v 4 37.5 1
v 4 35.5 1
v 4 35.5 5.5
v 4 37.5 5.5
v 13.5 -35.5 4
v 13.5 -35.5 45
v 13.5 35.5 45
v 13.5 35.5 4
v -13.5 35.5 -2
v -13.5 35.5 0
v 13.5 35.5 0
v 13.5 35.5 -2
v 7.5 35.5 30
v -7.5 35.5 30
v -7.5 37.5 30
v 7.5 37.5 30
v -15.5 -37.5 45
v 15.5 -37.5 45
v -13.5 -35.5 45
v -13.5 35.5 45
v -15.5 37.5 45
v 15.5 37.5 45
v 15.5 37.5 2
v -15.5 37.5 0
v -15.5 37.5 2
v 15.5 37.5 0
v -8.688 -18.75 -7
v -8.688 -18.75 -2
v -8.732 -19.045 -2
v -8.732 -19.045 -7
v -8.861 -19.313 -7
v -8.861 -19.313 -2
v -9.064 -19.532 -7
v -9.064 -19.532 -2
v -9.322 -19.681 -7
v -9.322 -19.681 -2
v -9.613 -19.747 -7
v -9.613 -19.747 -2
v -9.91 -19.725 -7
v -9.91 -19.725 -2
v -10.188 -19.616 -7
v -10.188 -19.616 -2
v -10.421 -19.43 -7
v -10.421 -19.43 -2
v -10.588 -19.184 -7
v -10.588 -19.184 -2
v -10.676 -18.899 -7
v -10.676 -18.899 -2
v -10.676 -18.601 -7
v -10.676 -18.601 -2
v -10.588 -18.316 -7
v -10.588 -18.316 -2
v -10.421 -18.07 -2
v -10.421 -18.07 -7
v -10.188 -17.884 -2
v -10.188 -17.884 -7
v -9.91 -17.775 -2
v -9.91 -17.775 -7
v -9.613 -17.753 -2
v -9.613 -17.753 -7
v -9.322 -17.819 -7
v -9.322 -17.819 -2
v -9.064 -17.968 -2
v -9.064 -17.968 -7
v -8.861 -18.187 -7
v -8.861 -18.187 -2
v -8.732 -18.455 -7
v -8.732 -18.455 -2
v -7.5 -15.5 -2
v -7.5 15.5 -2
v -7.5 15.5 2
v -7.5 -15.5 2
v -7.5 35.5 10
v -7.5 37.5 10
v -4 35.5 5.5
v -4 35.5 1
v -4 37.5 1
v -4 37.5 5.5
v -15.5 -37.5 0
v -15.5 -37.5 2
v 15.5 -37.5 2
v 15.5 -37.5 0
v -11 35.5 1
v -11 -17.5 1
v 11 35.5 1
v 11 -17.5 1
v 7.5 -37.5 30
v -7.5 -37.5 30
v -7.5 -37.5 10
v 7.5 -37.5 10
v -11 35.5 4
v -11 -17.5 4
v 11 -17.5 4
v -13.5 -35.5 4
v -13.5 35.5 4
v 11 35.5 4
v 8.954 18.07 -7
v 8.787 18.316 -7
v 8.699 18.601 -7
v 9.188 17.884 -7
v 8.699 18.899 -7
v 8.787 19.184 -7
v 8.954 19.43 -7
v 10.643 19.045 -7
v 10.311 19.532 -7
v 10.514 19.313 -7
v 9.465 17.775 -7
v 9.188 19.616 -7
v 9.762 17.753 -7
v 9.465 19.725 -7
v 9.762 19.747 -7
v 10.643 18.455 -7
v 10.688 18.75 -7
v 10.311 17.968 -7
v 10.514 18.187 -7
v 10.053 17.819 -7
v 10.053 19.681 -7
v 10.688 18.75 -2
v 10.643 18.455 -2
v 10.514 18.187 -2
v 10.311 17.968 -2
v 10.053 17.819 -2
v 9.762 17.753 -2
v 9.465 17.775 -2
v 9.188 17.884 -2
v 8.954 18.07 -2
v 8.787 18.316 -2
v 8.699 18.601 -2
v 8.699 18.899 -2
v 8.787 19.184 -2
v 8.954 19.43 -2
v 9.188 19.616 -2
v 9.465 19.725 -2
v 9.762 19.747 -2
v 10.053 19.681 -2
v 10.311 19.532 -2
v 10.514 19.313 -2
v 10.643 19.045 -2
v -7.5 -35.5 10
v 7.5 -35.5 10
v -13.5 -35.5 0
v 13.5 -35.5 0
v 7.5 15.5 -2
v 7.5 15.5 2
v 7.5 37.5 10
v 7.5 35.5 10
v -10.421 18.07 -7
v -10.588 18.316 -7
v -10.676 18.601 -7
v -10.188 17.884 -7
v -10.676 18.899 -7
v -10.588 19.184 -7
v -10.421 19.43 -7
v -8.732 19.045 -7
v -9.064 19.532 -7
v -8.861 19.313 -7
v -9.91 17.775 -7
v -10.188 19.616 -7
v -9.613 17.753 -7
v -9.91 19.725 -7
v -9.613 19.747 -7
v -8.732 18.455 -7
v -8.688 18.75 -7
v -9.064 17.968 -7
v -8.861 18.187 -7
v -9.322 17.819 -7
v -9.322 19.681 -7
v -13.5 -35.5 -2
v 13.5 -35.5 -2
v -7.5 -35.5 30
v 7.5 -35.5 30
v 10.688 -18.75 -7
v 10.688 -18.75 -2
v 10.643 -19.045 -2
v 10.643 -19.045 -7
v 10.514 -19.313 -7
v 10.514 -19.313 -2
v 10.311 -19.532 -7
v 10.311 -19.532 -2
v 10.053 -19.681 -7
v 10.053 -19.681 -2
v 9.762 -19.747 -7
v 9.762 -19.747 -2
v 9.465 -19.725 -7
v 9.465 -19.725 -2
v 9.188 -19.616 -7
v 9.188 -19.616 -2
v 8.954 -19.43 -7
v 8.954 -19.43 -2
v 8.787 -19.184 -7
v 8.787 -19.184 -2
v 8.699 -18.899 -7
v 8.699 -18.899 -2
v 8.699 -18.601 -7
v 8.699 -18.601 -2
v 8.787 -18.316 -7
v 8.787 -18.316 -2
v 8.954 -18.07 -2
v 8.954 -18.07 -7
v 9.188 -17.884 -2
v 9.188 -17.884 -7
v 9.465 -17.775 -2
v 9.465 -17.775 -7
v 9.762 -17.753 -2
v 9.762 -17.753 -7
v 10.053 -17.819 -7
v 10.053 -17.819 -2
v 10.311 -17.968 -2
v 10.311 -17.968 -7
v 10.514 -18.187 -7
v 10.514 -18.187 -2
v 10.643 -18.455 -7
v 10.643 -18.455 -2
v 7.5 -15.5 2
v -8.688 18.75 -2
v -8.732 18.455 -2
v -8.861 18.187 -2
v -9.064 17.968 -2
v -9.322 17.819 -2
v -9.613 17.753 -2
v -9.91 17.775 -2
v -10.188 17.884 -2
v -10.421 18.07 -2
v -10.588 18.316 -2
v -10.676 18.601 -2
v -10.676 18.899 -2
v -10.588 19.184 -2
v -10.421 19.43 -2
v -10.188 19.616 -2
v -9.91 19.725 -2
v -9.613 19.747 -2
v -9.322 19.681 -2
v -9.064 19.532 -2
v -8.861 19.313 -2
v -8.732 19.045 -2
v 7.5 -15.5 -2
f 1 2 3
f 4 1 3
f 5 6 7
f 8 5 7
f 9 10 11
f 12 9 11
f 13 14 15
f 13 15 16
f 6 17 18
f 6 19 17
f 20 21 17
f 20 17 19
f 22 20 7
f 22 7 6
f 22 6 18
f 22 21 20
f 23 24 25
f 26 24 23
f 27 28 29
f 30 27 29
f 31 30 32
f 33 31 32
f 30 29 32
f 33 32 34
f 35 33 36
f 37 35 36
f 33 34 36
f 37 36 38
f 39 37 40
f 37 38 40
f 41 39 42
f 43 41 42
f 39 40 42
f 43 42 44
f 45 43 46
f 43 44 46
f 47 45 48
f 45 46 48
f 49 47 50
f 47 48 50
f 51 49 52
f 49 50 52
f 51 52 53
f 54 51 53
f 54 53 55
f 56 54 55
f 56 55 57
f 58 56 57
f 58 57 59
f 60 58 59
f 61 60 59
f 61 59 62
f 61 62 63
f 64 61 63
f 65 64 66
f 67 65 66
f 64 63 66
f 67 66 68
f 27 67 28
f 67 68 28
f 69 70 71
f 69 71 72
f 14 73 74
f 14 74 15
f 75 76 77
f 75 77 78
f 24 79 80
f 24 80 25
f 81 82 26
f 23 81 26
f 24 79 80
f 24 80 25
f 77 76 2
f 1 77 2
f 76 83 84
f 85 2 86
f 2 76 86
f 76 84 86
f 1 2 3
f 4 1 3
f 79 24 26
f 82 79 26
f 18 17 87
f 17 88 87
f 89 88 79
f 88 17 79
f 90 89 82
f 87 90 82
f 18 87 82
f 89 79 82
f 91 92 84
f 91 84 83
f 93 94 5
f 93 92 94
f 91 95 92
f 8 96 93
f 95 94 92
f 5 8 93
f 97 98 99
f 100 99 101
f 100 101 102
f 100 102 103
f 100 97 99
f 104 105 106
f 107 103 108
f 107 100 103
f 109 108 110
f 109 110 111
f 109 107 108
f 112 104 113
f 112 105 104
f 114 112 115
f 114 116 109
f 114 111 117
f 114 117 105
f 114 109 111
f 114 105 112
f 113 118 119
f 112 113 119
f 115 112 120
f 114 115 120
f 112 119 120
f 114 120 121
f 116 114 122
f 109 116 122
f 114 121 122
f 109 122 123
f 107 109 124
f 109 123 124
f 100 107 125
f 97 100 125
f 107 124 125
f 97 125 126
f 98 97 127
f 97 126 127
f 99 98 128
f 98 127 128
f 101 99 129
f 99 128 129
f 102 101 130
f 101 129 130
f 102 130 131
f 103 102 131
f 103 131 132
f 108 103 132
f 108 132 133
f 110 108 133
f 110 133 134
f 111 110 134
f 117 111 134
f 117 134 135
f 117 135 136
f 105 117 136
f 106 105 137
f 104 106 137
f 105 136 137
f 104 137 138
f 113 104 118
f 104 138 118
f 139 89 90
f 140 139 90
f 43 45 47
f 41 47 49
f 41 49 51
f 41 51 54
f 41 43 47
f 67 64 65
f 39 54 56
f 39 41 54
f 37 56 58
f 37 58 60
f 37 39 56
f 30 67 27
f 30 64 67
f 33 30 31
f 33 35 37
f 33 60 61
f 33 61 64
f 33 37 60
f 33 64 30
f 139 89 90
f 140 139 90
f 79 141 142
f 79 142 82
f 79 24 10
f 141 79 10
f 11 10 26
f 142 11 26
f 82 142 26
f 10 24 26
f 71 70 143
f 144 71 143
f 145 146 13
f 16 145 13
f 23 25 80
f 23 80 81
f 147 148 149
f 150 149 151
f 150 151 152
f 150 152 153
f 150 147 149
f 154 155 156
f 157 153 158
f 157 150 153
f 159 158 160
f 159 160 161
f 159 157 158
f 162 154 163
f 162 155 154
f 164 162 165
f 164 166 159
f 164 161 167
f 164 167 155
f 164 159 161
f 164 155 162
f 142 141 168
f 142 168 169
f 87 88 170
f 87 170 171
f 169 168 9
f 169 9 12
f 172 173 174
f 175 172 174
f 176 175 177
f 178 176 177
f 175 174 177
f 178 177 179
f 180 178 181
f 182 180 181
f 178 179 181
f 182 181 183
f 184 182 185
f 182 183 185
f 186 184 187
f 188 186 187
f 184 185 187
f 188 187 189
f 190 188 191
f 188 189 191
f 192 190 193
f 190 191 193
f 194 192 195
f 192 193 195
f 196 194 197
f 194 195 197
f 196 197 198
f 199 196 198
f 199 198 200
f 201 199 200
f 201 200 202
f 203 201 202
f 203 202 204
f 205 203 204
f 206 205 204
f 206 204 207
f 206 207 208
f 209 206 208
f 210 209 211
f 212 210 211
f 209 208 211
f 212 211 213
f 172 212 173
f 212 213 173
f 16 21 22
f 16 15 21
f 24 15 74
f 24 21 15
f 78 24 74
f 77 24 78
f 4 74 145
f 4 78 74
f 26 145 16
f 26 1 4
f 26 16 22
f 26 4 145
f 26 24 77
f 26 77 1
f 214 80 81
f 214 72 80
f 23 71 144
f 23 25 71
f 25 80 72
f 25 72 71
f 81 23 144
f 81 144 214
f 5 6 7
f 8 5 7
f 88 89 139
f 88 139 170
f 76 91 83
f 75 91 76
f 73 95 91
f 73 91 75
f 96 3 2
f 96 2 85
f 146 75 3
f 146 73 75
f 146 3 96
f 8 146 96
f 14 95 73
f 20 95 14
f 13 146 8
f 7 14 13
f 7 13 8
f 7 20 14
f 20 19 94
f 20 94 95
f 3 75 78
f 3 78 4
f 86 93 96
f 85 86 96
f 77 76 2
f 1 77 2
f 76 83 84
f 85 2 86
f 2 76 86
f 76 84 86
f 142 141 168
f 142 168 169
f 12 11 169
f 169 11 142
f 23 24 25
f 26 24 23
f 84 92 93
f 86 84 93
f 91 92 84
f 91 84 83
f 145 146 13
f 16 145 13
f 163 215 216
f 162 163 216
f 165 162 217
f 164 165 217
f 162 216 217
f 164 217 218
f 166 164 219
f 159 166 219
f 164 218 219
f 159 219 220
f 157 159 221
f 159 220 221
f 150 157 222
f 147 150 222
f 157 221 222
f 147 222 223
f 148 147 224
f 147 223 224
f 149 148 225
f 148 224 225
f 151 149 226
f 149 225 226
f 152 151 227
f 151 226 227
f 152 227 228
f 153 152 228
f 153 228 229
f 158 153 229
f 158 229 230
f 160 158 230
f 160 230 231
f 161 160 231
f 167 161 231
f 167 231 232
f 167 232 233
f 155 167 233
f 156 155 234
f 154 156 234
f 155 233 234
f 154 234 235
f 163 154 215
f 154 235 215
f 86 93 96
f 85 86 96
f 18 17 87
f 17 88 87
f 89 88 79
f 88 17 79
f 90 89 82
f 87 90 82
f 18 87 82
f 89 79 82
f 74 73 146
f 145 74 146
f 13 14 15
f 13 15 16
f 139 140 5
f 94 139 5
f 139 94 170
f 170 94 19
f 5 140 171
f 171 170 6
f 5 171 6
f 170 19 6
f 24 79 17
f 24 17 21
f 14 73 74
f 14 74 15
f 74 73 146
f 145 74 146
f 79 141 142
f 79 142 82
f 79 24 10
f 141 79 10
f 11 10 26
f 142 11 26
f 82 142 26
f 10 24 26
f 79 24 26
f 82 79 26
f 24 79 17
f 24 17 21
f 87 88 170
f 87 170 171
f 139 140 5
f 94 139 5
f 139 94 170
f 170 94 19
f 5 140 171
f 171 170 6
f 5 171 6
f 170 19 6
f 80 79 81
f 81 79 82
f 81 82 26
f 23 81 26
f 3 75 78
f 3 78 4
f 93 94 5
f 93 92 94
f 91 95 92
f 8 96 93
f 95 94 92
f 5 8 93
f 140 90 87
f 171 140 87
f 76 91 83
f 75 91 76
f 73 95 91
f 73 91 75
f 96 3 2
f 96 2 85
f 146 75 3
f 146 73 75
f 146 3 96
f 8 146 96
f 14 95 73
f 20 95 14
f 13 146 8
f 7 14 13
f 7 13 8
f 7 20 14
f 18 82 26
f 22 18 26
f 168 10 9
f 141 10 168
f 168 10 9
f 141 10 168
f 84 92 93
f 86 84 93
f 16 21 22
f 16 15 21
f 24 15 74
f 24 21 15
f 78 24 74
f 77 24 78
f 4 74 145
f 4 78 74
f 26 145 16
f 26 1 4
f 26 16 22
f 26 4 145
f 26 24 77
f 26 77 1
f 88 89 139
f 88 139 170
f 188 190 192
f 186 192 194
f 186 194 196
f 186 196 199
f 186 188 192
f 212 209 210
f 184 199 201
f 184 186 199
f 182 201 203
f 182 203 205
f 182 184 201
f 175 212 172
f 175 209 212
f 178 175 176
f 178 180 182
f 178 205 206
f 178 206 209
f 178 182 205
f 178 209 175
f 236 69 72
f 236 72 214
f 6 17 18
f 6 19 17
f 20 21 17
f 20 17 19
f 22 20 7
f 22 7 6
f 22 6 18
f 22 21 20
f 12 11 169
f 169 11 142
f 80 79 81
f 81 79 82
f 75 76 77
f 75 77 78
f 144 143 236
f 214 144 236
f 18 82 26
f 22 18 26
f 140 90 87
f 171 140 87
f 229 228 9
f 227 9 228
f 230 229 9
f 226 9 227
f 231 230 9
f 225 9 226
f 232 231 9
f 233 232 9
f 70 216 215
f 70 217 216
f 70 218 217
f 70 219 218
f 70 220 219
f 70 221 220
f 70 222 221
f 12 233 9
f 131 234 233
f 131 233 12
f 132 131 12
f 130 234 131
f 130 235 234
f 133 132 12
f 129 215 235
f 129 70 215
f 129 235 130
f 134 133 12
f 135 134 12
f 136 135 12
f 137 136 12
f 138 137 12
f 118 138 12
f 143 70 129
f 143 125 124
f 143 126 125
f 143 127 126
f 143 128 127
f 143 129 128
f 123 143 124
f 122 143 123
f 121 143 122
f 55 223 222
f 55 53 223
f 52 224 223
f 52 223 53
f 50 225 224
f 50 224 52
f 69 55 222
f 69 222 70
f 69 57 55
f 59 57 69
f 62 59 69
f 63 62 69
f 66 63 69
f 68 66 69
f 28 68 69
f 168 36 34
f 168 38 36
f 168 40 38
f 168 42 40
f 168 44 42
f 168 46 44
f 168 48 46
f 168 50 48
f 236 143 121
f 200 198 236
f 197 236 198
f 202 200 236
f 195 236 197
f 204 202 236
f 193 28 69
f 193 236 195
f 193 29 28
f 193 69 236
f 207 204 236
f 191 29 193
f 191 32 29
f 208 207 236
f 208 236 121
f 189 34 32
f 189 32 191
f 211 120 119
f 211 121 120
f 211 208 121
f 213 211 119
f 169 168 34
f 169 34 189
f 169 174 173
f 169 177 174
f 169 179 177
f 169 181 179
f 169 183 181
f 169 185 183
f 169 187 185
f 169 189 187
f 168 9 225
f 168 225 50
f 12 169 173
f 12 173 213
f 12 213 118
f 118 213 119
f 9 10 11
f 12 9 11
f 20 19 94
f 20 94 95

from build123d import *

# Parameters (mm, degrees)
SKETCH_W        = 31
SKETCH_H        = 75
PAD_DEPTH       = 45
SKETCH001_W     = 15
SKETCH001_H     = 20
POCKET_DEPTH    = 75
SKETCH002_W     = 27
SKETCH002_H     = 71
POCKET001_DEPTH = 41
SKETCH003_W     = 22
SKETCH003_H     = 53
POCKET002_DEPTH = 3
SKETCH004_W     = 8
SKETCH004_H     = 4.5
POCKET003_DEPTH = 5
SKETCH005_W     = 31
SKETCH005_H     = 75
PAD001_DEPTH    = 2
SKETCH006_W     = 27
SKETCH006_H     = 71
PAD002_DEPTH    = 2
SKETCH007_W     = 15
SKETCH007_H     = 31
POCKET004_DEPTH = 5
SKETCH008_R     = 1
PAD003_DEPTH    = 5
SKETCH009_W     = 31
SKETCH009_H     = 75
PAD004_DEPTH    = 45
SKETCH010_W     = 15
SKETCH010_H     = 20
POCKET005_DEPTH = 75
SKETCH011_W     = 27
SKETCH011_H     = 71
POCKET006_DEPTH = 41
SKETCH012_W     = 22
SKETCH012_H     = 53
POCKET007_DEPTH = 3
SKETCH013_W     = 8
SKETCH013_H     = 4.5
POCKET008_DEPTH = 5
SKETCH014_W     = 31
SKETCH014_H     = 75
PAD005_DEPTH    = 2
SKETCH015_W     = 27
SKETCH015_H     = 71
PAD006_DEPTH    = 2


with BuildPart() as body:
    # Sketch → Pad (new body)
    with BuildSketch(Plane.XY):
        Rectangle(SKETCH_W, SKETCH_H)
    extrude(amount=PAD_DEPTH)

    # Sketch001 (on Face3 of Pad) → Pocket (cut)
    with BuildSketch(Plane.XZ.offset(37.5)):
        with Locations((0, 20)):
            Rectangle(SKETCH001_W, SKETCH001_H)
    extrude(amount=-POCKET_DEPTH, mode=Mode.SUBTRACT)

    # Sketch002 (on Face4 of Pocket) → Pocket001 (cut)
    with BuildSketch(Plane.XY.offset(45)):
        Rectangle(SKETCH002_W, SKETCH002_H)
    extrude(amount=-POCKET001_DEPTH, mode=Mode.SUBTRACT)

    # Sketch003 (on Face19 of Pocket001) → Pocket002 (cut)
    with BuildSketch(Plane.XY.offset(4)):
        with Locations((0, 9)):
            Rectangle(SKETCH003_W, SKETCH003_H)
    extrude(amount=-POCKET002_DEPTH, mode=Mode.SUBTRACT)

    # Sketch004 (on Face14 of Pocket002) → Pocket003 (cut)
    with BuildSketch(Plane.XZ.offset(-35.5)):
        with Locations((0, 3.25)):
            Rectangle(SKETCH004_W, SKETCH004_H)
    extrude(amount=-POCKET003_DEPTH, mode=Mode.SUBTRACT)


with BuildPart() as display_lid:
    # Sketch005 → Pad001 (new body)
    with BuildSketch(Plane.XY):
        Rectangle(SKETCH005_W, SKETCH005_H)
    extrude(amount=PAD001_DEPTH)

    # Sketch006 (on Face5 of Pad001) → Pad002 (join)
    with BuildSketch(Plane(origin=(0, 0, 0), x_dir=(1, 0, 0), z_dir=(0, 0, -1))):
        Rectangle(SKETCH006_W, SKETCH006_H)
    extrude(amount=PAD002_DEPTH)

    # Sketch007 (on Face11 of Pad002) → Pocket004 (cut)
    with BuildSketch(Plane(origin=(0, 0, -2), x_dir=(1, 0, 0), z_dir=(0, 0, -1))):
        Rectangle(SKETCH007_W, SKETCH007_H)
    extrude(amount=-POCKET004_DEPTH, mode=Mode.SUBTRACT)

    # Sketch008 (on Face15 of Pocket004) → Pad003 (join)
    with BuildSketch(Plane(origin=(0, 0, -2), x_dir=(1, 0, 0), z_dir=(0, 0, -1))):
        with Locations((-9.6875, 18.75)):
            Circle(SKETCH008_R)
        with Locations((9.6875, 18.75)):
            Circle(SKETCH008_R)
        with Locations((9.6875, -18.75)):
            Circle(SKETCH008_R)
        with Locations((-9.6875, -18.75)):
            Circle(SKETCH008_R)
    extrude(amount=PAD003_DEPTH)


with BuildPart() as body002:
    # Sketch009 → Pad004 (new body)
    with BuildSketch(Plane.XY):
        Rectangle(SKETCH009_W, SKETCH009_H)
    extrude(amount=PAD004_DEPTH)

    # Sketch010 (on Face3 of Pad004) → Pocket005 (cut)
    with BuildSketch(Plane.XZ.offset(37.5)):
        with Locations((0, 20)):
            Rectangle(SKETCH010_W, SKETCH010_H)
    extrude(amount=-POCKET005_DEPTH, mode=Mode.SUBTRACT)

    # Sketch011 (on Face4 of Pocket005) → Pocket006 (cut)
    with BuildSketch(Plane.XY.offset(45)):
        Rectangle(SKETCH011_W, SKETCH011_H)
    extrude(amount=-POCKET006_DEPTH, mode=Mode.SUBTRACT)

    # Sketch012 (on Face19 of Pocket006) → Pocket007 (cut)
    with BuildSketch(Plane.XY.offset(4)):
        with Locations((0, 9)):
            Rectangle(SKETCH012_W, SKETCH012_H)
    extrude(amount=-POCKET007_DEPTH, mode=Mode.SUBTRACT)

    # Sketch013 (on Face14 of Pocket007) → Pocket008 (cut)
    with BuildSketch(Plane.XZ.offset(-35.5)):
        with Locations((0, 3.25)):
            Rectangle(SKETCH013_W, SKETCH013_H)
    extrude(amount=-POCKET008_DEPTH, mode=Mode.SUBTRACT)


with BuildPart() as solid_lid:
    # Sketch014 → Pad005 (new body)
    with BuildSketch(Plane.XY):
        Rectangle(SKETCH014_W, SKETCH014_H)
    extrude(amount=PAD005_DEPTH)

    # Sketch015 (on Face5 of Pad005) → Pad006 (join)
    with BuildSketch(Plane(origin=(0, 0, 0), x_dir=(1, 0, 0), z_dir=(0, 0, -1))):
        Rectangle(SKETCH015_W, SKETCH015_H)
    extrude(amount=PAD006_DEPTH)


solid = Compound([body.part, display_lid.part, body002.part, solid_lid.part])
